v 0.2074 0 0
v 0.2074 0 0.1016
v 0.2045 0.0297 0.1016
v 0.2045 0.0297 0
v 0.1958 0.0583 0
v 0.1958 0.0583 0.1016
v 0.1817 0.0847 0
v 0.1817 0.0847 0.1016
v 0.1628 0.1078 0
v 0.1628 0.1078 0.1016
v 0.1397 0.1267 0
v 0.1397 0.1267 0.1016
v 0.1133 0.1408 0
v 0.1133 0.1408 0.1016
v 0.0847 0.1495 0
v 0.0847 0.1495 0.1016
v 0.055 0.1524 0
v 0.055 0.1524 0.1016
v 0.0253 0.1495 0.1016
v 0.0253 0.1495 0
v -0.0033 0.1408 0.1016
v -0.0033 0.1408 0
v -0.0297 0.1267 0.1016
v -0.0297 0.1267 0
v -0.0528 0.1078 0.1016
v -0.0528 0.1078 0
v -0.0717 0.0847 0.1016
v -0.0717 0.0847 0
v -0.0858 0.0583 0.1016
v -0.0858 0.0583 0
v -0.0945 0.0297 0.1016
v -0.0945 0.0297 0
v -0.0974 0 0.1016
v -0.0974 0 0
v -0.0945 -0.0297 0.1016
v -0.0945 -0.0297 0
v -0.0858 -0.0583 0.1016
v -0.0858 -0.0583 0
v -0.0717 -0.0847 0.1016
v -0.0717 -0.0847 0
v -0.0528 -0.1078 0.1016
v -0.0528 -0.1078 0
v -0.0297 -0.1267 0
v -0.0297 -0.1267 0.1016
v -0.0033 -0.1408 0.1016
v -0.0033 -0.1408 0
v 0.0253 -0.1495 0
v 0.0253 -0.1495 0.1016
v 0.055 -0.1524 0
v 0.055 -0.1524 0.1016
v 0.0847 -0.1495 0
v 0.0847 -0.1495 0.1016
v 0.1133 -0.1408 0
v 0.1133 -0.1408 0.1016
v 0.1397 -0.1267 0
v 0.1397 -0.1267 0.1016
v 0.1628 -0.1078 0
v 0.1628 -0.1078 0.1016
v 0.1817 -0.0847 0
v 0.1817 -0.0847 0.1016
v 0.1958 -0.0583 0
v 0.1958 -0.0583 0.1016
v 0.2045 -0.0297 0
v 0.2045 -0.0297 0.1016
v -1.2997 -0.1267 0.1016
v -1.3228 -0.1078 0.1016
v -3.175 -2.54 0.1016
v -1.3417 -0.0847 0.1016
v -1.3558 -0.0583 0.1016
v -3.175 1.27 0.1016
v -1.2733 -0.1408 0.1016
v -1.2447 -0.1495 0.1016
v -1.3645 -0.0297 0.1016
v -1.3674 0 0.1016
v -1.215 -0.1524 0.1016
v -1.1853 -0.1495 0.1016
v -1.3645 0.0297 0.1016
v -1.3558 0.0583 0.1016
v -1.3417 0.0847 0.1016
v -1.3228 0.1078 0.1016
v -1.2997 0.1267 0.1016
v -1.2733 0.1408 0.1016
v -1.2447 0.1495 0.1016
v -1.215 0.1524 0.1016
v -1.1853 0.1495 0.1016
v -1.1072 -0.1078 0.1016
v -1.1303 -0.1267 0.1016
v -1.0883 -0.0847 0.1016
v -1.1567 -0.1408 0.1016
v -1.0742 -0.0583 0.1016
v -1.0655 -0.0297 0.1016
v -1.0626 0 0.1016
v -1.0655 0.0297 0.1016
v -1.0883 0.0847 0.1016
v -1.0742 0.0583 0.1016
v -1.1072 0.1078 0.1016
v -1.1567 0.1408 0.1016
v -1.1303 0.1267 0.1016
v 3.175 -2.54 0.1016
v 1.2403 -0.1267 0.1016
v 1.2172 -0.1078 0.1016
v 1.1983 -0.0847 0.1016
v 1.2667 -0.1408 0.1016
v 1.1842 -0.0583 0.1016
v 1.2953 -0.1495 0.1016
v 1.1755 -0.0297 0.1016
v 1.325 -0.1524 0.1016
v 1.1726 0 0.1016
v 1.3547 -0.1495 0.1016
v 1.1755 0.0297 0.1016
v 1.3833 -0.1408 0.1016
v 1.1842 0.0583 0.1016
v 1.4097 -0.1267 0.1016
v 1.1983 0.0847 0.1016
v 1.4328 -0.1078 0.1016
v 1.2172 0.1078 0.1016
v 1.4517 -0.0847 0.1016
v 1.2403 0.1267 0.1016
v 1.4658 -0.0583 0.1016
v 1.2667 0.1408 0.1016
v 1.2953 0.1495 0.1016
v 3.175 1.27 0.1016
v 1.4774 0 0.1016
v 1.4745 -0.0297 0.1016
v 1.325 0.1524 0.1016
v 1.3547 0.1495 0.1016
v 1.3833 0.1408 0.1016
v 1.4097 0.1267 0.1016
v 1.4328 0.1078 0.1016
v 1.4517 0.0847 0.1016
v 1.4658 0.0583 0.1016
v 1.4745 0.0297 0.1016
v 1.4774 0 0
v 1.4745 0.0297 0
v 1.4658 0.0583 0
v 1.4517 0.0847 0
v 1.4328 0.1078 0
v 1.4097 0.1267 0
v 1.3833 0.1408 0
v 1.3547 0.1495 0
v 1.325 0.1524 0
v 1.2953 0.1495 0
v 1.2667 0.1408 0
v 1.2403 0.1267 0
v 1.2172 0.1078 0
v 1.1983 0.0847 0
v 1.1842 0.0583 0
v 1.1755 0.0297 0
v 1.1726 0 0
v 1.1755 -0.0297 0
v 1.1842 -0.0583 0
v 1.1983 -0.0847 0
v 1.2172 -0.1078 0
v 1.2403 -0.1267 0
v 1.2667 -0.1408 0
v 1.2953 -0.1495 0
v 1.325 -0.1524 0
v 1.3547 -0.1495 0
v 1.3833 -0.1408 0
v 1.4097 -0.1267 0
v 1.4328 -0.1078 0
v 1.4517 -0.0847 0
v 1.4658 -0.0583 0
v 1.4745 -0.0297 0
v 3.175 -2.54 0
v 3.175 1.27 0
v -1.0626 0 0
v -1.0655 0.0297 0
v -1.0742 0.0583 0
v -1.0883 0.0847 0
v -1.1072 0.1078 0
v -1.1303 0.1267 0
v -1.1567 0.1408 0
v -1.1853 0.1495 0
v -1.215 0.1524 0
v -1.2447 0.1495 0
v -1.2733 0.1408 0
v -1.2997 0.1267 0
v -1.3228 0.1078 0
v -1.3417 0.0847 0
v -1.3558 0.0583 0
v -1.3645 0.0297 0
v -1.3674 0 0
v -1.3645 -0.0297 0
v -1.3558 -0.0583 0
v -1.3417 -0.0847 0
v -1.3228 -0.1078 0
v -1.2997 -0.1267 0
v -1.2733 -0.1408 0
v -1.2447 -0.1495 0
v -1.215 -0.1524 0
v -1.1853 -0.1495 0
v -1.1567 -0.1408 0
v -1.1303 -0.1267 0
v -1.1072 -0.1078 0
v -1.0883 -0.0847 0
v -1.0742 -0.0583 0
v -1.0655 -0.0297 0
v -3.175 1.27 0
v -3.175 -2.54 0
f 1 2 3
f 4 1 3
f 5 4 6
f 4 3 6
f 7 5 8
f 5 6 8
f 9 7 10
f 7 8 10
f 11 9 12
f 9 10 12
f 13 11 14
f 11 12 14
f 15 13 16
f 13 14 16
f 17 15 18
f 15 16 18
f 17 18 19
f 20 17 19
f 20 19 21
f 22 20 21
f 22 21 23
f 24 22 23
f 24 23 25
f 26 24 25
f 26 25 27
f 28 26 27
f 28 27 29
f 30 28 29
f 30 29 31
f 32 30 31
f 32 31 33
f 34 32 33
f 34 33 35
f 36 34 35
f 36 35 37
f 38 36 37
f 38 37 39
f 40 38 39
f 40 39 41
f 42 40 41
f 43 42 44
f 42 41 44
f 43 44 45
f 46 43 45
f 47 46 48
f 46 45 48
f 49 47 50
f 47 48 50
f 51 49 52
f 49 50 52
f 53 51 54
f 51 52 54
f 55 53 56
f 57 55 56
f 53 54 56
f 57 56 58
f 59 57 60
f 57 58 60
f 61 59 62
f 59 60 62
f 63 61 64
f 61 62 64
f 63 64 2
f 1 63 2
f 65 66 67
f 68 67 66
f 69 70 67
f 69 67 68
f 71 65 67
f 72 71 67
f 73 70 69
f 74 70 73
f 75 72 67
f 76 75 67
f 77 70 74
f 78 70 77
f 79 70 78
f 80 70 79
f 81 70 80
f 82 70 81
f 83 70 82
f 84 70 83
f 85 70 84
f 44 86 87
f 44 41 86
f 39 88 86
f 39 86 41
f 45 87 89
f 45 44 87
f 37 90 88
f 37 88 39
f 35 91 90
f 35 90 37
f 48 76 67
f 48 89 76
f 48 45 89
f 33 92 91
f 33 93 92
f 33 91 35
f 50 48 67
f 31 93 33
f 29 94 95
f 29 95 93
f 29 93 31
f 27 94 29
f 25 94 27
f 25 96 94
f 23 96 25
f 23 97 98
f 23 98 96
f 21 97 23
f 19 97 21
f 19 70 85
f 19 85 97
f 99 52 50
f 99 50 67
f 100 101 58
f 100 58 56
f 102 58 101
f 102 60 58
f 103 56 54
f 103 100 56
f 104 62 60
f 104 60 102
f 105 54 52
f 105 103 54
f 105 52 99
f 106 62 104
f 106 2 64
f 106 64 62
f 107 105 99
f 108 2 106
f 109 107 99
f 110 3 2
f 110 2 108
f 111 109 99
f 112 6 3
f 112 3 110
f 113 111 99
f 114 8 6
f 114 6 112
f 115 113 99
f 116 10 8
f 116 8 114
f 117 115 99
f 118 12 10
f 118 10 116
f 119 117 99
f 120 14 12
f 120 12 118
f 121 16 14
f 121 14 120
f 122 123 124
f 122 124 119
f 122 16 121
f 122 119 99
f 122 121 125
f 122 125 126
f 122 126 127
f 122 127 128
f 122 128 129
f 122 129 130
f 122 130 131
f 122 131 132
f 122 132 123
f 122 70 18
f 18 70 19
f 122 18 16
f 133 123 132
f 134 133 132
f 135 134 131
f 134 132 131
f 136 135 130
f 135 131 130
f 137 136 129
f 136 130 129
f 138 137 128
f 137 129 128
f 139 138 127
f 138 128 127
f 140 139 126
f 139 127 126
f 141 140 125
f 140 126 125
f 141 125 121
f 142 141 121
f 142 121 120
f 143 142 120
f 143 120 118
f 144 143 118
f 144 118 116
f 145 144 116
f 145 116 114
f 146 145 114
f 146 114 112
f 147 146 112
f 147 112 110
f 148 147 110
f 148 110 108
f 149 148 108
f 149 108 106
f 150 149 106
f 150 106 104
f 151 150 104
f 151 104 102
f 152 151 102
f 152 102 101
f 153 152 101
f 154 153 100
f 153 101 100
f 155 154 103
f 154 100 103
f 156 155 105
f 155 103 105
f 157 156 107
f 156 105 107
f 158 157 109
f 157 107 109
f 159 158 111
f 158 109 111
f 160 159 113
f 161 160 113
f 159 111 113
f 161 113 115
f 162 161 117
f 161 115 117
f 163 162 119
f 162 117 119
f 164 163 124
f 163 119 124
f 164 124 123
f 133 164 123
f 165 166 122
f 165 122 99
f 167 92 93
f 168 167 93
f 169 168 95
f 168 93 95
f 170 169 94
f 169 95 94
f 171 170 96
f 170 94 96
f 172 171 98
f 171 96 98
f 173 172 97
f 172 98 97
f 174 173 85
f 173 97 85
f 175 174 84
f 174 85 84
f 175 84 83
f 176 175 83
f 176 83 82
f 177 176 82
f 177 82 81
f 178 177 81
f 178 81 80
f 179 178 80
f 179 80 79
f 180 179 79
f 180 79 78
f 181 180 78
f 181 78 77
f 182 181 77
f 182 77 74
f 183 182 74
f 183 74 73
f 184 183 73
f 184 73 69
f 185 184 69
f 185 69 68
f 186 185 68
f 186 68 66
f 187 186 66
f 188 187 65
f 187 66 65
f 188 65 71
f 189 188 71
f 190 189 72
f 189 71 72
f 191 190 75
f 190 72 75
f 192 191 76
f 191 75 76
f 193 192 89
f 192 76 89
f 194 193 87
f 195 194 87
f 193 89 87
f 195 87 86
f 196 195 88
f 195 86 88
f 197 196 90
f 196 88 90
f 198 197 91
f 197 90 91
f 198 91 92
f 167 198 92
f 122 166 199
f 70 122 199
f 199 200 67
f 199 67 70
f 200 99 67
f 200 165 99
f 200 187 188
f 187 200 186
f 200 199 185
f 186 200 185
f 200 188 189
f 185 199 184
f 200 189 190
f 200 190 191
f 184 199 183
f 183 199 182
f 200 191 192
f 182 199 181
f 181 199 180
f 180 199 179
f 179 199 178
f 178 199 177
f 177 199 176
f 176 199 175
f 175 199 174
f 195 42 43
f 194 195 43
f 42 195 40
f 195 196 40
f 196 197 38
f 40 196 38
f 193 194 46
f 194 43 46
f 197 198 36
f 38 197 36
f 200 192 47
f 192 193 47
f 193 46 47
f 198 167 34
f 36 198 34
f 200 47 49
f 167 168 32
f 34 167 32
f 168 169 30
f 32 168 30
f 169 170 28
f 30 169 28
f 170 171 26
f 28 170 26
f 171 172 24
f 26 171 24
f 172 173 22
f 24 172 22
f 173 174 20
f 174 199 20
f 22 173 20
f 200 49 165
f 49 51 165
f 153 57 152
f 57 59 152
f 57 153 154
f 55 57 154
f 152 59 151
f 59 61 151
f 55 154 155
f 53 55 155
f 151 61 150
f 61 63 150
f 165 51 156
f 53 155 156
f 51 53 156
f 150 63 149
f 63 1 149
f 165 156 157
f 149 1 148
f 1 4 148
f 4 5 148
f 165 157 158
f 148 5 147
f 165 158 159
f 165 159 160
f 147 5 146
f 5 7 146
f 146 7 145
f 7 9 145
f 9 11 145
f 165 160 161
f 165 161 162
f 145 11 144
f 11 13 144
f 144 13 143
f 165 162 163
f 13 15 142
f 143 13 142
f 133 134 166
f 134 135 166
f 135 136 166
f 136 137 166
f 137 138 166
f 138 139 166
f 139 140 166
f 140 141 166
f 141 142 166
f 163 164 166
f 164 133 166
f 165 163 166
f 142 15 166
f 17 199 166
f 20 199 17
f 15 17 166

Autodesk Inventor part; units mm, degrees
ref_plane "YZ Plane" through (0, 0, 0) normal (1, 0, 0) x (0, 1, 0)
ref_plane "XZ Plane" through (0, 0, 0) normal (0, 1, 0) x (-1, 0, 0)
ref_plane "XY Plane" through (0, 0, 0) normal (0, 0, 1) x (1, 0, 0)
sketch "Sketch1" plane through (0, 0, 0) normal (0, 0, 1) x (1, 0, 0)
  line L0 (3.175, 1.27) -> (3.175, -2.54)
  line L1 (3.175, -2.54) -> (-3.175, -2.54)
  line L2 (-3.175, -2.54) -> (-3.175, 1.27)
  line L3 (-4.445, 0) -> (4.445, 0) projected
  line L4 (3.175, 1.27) -> (-3.175, 1.27)
  line L5 (0, -3.302) -> (0, 2.032) projected
  point P0 (0, 0)
  dimension "d0" = 6.35
  dimension "d12" = 2.54
  dimension "d14" = 1.27
extrude "Extrusion1" add sketch "Sketch1" along normal blind 0.1016
sketch "Sketch2" plane through (0, 0, 0.1016) normal (0, 0, 1) x (1, 0, 0)
  line L0 (-4.445, 0) -> (4.445, 0) projected
  line L1 (0, -3.302) -> (0, 2.032) projected
  line L2 (-3.175, -2.54) -> (3.175, -2.54) projected
  line L3 (3.175, -2.54) -> (3.175, 1.27) projected
  line L4 (-3.175, 1.27) -> (-3.175, -2.54) projected
  circle A0 centre (1.325, 0) radius 0.1524
  line L5 (3.175, 1.27) -> (-3.175, 1.27) projected
  point P0 (0, 0)
  dimension "d4" = 0.3048
  dimension "d5" = 1.85
extrude "Extrusion2" cut sketch "Sketch2" against normal through all contours A0 L0 | L0 A0
pattern_linear "Rectangular Pattern1" count 3 spacing 1.27 along (-1, 0, 0) of "Extrusion2"
equation "\"BendRadius\" = Thickness"
equation "\"BendReliefWidth\" = Thickness"
equation "\"BendReliefDepth\" = 0.5 * Thickness"
equation "\"CornerReliefSize\" = 4 * Thickness"
equation "\"MinimumRemnant\" = 2 * Thickness"
equation "\"TransitionRadius\" = BendRadius"
equation "\"JacobiRadiusSize\" = BendRadius"
equation "\"GapSize\" = Thickness"
equation "\"Thickness\" = 3.048"
properties part number "KaptonReedNozzleSheet"
